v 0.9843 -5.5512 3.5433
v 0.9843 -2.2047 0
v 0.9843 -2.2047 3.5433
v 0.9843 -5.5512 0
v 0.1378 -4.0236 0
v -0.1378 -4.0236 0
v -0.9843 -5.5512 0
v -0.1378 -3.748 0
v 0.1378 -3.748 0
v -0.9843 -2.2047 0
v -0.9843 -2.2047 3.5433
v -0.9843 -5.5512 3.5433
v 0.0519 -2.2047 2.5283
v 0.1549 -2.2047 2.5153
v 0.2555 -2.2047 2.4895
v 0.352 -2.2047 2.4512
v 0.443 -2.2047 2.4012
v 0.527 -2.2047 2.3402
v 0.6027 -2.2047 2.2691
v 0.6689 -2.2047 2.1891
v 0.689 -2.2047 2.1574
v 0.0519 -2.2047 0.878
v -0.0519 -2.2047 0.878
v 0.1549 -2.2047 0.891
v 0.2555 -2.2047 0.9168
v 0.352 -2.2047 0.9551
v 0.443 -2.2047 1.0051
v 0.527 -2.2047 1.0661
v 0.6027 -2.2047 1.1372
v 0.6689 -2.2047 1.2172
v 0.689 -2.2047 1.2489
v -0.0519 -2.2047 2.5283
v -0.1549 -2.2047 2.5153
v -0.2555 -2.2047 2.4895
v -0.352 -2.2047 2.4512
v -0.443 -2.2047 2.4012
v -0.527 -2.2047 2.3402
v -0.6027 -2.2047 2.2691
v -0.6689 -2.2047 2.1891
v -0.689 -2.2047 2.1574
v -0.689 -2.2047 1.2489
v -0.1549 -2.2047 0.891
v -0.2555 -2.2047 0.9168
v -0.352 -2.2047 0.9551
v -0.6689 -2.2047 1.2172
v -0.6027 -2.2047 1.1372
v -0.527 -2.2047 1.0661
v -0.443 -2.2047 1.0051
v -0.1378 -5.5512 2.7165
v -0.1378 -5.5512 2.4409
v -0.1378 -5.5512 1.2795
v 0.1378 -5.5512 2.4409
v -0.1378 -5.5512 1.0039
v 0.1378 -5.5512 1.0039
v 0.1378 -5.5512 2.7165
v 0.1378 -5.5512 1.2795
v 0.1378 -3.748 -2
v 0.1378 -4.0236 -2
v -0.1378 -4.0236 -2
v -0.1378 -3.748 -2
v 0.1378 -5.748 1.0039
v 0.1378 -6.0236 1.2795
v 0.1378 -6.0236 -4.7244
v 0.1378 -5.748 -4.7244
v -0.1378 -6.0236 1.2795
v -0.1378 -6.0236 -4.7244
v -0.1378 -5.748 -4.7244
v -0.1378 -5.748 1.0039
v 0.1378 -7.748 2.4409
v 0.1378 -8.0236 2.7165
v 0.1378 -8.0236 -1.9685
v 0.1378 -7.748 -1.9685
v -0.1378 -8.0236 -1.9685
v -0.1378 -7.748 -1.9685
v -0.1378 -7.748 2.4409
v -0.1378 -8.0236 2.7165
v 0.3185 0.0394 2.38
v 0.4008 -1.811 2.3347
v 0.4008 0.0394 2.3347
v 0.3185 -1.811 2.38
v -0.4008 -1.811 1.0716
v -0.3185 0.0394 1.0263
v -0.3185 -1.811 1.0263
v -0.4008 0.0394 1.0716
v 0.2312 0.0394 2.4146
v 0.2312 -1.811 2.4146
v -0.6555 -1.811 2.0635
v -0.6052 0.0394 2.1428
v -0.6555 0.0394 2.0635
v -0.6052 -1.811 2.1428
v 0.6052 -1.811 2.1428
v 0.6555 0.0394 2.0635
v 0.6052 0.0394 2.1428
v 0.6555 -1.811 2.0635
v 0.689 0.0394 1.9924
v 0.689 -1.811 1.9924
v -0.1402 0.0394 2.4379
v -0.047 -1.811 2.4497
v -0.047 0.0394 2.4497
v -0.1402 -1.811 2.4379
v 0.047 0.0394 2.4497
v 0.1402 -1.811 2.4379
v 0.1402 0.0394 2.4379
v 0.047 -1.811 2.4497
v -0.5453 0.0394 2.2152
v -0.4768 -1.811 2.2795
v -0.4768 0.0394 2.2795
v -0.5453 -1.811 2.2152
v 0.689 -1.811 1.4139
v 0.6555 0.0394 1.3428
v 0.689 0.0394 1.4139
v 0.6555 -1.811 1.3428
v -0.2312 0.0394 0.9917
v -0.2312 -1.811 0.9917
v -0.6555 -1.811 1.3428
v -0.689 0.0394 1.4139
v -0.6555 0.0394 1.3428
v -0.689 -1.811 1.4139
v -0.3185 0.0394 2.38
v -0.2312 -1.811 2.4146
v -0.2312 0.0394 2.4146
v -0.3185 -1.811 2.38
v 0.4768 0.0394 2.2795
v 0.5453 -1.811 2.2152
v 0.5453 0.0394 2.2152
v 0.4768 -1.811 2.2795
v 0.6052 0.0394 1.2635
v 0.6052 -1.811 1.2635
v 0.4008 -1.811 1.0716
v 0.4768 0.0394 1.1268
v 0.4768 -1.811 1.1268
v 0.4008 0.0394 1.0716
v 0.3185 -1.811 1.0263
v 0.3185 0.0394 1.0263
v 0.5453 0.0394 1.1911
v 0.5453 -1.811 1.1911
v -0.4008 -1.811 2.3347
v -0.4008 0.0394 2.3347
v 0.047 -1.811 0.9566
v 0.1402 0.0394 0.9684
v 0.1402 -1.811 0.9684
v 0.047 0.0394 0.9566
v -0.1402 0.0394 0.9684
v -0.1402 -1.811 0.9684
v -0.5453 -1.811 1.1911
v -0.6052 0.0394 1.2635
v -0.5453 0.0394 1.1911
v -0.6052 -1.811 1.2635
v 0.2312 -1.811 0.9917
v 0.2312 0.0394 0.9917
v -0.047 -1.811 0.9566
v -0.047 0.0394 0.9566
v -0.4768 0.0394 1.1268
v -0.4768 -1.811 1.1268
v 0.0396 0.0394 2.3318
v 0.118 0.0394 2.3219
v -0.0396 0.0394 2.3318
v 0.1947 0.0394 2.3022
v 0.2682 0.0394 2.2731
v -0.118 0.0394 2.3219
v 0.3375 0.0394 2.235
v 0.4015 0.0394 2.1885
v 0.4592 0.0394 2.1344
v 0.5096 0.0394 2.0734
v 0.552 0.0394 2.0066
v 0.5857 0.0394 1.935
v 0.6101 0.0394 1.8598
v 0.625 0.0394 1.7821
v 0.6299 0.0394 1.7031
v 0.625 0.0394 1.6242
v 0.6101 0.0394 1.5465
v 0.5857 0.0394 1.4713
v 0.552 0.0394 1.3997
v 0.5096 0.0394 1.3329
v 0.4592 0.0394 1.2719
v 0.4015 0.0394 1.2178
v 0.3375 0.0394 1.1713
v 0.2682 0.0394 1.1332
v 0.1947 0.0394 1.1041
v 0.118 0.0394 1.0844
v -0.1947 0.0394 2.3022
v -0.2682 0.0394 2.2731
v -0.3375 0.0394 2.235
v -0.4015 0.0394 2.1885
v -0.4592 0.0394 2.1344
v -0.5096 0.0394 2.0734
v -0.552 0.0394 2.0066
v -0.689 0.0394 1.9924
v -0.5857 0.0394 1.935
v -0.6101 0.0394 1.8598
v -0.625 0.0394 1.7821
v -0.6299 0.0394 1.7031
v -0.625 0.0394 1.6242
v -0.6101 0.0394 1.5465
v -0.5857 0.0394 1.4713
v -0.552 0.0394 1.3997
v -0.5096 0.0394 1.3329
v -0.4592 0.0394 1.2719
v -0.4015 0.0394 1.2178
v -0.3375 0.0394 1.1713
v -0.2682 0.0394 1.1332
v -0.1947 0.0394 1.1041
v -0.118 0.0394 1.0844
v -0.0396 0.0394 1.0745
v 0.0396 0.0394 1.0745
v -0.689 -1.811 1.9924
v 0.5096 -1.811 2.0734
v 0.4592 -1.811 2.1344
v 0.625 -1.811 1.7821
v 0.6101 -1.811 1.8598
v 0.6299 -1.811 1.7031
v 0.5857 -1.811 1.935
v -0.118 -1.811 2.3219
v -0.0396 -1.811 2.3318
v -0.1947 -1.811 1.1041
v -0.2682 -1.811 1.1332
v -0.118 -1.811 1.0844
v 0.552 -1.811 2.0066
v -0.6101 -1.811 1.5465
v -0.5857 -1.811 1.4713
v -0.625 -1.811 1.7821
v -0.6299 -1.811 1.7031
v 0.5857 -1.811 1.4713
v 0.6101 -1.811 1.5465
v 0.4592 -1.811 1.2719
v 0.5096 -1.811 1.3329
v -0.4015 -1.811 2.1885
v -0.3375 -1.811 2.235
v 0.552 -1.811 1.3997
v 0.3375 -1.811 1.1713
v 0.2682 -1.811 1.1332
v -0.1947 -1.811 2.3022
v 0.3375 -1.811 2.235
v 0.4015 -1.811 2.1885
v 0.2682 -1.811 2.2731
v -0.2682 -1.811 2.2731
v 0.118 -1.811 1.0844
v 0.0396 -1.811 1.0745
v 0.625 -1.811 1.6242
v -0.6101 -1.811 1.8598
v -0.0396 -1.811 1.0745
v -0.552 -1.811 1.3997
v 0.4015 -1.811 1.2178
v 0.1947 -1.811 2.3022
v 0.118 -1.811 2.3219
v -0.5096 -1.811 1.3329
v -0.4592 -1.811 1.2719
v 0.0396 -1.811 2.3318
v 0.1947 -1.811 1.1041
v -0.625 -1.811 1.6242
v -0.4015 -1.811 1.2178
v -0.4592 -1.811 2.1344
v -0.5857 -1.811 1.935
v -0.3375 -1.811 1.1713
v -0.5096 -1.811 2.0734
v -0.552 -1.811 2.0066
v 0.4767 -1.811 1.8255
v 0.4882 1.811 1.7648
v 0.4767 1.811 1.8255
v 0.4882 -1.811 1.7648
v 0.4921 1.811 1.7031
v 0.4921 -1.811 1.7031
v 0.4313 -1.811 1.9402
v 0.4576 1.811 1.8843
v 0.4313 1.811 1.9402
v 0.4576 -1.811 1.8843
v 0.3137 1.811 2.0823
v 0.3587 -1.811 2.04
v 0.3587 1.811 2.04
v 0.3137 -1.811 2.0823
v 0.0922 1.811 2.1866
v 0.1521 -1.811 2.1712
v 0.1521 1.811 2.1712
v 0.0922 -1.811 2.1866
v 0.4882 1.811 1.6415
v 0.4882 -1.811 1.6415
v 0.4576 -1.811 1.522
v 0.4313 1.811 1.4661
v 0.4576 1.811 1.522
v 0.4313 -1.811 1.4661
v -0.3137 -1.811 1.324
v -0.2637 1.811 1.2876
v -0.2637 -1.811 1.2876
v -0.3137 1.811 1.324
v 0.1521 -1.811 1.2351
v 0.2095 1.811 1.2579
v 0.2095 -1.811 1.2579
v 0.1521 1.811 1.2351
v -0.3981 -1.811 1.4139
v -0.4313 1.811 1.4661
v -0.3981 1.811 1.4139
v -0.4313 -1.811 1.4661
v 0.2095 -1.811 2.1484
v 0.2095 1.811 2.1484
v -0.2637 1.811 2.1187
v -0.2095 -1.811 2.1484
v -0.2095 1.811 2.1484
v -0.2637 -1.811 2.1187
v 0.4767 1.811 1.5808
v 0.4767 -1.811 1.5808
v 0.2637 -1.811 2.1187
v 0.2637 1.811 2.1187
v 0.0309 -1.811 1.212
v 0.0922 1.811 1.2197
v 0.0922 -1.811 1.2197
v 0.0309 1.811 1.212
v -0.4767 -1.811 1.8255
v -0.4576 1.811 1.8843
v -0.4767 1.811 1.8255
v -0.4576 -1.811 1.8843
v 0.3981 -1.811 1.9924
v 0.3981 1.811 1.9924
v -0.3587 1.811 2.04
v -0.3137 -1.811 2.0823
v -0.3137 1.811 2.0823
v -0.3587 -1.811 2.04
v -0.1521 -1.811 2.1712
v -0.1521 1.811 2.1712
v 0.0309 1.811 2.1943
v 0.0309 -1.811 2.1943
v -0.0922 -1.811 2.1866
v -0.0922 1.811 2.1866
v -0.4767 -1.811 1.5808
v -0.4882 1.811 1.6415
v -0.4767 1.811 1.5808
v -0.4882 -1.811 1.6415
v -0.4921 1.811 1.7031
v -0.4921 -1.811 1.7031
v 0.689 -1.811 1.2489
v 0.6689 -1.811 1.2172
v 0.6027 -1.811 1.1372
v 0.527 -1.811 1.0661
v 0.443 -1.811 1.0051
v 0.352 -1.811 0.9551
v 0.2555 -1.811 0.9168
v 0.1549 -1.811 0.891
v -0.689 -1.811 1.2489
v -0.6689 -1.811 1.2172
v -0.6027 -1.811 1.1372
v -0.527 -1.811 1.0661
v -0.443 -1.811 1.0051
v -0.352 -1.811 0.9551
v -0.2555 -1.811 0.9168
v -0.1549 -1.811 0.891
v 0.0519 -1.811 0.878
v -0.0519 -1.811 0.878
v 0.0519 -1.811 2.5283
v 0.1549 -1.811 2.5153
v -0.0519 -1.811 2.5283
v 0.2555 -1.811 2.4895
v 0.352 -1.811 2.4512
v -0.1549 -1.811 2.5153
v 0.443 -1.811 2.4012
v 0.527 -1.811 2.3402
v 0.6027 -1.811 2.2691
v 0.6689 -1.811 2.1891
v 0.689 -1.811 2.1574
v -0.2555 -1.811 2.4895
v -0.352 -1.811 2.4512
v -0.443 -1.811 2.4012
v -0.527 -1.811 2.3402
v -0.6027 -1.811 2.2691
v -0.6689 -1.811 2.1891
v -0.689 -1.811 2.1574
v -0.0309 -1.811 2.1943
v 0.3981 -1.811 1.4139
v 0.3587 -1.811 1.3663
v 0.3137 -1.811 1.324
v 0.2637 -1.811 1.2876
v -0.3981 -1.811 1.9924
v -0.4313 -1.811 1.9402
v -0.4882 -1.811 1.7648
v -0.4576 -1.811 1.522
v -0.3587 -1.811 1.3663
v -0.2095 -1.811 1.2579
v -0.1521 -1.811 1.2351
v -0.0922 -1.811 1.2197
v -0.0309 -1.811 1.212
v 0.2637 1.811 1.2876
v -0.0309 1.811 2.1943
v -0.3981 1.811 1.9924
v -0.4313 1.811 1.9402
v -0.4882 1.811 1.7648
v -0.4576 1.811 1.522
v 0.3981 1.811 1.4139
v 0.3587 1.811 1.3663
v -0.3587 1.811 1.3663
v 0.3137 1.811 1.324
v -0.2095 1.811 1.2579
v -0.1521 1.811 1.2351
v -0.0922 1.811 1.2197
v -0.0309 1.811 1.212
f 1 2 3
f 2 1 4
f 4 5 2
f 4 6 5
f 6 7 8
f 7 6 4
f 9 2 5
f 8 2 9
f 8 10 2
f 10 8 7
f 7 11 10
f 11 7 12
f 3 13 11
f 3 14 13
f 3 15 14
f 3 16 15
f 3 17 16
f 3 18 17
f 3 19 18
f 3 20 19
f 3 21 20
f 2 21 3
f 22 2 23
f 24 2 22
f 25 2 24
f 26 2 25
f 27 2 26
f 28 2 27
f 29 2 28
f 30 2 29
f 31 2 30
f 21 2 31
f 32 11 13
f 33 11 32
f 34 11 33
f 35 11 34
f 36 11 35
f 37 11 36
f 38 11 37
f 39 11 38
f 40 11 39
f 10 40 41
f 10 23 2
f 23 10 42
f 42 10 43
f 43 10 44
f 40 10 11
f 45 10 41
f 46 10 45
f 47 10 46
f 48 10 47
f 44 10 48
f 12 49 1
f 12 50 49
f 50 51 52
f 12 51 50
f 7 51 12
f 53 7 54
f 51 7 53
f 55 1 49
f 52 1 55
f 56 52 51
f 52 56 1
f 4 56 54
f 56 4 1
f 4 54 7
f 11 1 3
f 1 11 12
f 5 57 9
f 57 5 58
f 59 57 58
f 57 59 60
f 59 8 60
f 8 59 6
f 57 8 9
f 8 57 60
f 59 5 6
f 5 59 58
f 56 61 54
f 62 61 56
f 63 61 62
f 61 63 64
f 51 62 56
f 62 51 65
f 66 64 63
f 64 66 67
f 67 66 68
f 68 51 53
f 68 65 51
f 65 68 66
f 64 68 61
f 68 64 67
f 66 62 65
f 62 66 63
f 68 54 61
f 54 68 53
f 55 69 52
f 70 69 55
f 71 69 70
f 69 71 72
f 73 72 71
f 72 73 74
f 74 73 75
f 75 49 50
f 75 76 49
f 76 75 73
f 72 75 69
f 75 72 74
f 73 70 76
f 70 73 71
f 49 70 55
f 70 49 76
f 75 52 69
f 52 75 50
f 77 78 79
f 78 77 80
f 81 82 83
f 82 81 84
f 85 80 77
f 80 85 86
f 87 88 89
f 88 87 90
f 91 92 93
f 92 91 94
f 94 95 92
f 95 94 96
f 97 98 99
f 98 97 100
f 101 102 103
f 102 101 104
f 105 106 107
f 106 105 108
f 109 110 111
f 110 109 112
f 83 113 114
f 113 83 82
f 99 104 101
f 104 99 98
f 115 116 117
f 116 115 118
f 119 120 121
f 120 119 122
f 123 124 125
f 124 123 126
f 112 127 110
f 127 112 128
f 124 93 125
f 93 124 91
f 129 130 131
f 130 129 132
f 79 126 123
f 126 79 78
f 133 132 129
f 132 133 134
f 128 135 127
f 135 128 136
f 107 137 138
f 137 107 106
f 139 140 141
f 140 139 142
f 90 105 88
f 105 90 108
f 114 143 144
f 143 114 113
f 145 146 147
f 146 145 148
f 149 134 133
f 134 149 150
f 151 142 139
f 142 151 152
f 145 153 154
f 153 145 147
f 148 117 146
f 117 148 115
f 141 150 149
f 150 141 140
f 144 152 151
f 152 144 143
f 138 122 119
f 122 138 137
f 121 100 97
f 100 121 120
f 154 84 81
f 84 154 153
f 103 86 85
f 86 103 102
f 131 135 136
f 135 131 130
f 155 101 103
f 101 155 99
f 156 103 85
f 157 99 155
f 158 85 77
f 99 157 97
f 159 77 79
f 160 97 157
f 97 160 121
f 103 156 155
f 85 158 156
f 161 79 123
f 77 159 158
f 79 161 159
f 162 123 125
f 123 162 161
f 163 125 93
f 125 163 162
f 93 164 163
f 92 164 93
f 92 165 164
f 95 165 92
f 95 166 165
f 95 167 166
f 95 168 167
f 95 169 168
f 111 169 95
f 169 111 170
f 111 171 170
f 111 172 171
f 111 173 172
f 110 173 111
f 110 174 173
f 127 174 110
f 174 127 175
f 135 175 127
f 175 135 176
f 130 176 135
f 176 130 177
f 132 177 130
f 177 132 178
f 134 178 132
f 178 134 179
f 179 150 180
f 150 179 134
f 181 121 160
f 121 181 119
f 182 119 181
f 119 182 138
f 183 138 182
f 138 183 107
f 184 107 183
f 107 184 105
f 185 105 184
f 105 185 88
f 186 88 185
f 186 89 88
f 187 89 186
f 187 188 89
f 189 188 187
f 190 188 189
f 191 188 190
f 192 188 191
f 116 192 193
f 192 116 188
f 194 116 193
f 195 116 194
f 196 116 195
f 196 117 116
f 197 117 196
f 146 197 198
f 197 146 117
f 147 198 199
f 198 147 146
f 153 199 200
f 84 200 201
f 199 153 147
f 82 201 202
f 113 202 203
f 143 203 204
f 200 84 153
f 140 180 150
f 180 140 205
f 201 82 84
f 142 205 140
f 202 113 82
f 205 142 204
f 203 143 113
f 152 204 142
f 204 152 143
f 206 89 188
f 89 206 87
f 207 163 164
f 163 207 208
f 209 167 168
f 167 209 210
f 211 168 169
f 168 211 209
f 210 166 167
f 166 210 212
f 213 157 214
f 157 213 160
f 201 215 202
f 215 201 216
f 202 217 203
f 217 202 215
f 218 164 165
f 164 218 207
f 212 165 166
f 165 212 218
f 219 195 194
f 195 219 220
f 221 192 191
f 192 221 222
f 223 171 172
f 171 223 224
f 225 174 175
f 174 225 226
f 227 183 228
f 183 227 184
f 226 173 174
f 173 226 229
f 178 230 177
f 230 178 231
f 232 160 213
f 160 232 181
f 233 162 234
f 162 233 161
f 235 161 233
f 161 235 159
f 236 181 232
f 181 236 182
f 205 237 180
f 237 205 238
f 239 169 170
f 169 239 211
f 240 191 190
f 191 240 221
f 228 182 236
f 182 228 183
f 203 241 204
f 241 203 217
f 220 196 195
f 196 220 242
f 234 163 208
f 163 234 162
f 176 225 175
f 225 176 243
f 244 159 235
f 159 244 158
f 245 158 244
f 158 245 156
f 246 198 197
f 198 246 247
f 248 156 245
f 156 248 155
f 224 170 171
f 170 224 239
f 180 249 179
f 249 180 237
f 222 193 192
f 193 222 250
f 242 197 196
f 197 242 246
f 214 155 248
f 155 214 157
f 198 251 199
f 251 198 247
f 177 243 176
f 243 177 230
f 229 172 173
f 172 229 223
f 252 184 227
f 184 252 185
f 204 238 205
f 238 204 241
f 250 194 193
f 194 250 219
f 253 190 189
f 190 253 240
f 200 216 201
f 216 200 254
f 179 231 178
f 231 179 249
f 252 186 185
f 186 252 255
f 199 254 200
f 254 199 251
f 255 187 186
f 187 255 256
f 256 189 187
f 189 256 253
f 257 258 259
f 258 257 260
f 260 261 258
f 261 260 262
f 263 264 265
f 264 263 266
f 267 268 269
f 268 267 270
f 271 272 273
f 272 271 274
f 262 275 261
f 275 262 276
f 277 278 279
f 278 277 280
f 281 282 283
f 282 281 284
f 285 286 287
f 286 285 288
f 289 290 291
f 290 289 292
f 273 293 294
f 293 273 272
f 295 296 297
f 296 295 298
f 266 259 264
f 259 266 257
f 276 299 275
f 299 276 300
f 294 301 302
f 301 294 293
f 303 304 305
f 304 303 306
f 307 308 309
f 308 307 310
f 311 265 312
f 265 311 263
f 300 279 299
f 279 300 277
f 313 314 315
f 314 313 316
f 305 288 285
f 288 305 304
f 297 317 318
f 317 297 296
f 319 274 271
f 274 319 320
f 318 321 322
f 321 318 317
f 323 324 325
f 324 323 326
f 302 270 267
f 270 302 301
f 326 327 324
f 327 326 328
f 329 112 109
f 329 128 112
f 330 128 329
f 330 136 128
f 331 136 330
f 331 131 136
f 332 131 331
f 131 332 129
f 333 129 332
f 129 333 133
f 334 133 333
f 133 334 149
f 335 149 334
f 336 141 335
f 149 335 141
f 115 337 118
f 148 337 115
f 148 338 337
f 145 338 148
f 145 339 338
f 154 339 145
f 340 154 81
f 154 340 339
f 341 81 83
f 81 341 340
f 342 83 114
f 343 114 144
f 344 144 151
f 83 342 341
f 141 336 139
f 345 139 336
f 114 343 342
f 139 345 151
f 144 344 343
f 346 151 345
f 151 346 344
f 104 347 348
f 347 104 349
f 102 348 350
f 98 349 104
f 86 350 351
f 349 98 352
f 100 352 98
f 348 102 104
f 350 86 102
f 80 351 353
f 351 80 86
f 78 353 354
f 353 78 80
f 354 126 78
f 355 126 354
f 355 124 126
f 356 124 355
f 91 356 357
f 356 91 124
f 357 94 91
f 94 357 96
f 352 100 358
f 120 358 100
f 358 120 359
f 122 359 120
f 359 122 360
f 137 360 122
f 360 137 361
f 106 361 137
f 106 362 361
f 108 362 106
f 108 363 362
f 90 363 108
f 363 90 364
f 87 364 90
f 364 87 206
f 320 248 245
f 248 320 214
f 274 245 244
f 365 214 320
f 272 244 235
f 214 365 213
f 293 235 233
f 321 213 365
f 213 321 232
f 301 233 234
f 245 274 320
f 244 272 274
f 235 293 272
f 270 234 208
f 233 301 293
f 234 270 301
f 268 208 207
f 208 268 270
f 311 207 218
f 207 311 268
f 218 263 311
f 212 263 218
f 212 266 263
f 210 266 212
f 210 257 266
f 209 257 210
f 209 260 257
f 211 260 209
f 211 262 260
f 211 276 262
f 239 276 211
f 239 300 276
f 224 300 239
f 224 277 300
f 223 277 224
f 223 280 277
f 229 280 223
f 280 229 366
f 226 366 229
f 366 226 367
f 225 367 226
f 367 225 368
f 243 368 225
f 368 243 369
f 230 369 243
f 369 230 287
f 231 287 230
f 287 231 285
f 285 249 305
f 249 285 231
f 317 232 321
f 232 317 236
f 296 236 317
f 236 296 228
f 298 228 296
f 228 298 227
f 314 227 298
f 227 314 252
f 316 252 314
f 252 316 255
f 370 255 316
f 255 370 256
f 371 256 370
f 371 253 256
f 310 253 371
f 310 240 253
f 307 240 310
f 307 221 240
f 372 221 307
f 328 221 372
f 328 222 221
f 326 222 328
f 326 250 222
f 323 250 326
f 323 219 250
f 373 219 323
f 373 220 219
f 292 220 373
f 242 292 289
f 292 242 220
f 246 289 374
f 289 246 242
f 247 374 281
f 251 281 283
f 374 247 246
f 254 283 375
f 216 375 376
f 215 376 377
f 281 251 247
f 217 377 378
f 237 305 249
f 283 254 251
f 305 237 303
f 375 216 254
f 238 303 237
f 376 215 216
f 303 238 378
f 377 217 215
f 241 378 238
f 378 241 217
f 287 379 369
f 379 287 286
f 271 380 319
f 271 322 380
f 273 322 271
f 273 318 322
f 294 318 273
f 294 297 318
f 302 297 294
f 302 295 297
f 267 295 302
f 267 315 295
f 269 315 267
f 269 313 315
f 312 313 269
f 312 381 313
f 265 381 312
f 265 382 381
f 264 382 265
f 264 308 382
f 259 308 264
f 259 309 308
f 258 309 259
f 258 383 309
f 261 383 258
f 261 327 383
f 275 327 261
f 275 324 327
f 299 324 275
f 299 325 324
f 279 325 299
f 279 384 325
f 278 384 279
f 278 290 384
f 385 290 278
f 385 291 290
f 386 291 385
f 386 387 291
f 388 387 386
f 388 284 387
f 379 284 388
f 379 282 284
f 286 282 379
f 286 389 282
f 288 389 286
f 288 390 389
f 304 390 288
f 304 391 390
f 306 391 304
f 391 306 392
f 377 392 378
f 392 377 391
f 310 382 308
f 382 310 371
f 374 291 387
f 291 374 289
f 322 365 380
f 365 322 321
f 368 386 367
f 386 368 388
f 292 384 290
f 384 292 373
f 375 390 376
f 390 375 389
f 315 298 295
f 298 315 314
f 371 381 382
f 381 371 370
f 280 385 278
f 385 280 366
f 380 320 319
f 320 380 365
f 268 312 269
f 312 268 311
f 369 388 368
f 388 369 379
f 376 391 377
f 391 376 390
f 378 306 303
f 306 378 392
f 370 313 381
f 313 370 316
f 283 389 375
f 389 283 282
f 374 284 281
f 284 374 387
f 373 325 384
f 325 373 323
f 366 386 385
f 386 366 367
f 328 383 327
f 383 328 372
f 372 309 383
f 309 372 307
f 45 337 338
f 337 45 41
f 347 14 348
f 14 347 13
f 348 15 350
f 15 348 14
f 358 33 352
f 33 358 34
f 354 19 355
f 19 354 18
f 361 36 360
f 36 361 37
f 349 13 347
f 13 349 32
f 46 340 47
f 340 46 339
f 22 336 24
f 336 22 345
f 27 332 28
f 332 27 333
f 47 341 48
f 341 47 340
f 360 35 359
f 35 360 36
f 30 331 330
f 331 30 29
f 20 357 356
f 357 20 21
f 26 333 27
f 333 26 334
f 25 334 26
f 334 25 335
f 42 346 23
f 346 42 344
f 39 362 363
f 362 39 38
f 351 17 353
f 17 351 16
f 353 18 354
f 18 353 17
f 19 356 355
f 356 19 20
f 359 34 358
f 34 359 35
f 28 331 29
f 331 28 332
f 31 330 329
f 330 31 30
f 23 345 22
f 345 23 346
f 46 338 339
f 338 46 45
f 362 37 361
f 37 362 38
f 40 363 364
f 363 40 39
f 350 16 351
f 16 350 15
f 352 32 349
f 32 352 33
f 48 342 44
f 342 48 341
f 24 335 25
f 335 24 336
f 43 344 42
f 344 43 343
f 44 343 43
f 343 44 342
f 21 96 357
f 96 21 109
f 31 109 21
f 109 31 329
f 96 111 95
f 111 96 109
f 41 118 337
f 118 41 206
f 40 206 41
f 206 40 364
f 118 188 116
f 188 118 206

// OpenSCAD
module tp33ww() {
  $fn = 50;
  translate([-2.5, 0, 0]) {
    color("black")
    {
      translate([0, 0.5, 0.5])
        cube([5, 8, 8.5]);
    }
    color("silver")
    {
      translate([0, 0.5, 0])
        cube([5, 8.5, 0.5]);
      translate([0, 8.5, 0.5])
        cube([5, 0.5, 8.5]);
      translate([2.15, 5.08-0.7, -5.08])
        cube([0.7, 0.7, 5.08]);
    }
    brass = [225/255, 193/255, 110/255];
    color(brass)
    {
      translate([2.15, -0.7, -12]) {
        cube([0.7, 0.7, 15.25]);
        translate([0, 0, 14.55])
          cube([0.7, 2, 0.7]);
      }
      translate([2.15, -(0.7+5.08), -5]) {
        cube([0.7, 0.7, 11.25]);
        translate([0, 0, 11.2])
          cube([0.7, 7, 0.7]);
      }
    }
  }
  {
    translate([0, 10, 4.326])
      rotate([90, 0, 0]) {
        color("black")
          intersection() {
            union() {
              translate([0, 0, -9.2])
                cylinder(d=2.5, h=9.2);
              cylinder(d=4.2, h=1);
              translate([0, 0, -4.7])
                difference() {
                  cylinder(d=3.8, h=5.7);
                  cylinder(d=3.2, h=5.7);
                }
            }
            cube([3.5, 10, 30], true);
        }
      }
  }
}

scaling = 0.3937;
scale([scaling, scaling, scaling])
  translate([0, -14.6, 0])
    tp33ww();
